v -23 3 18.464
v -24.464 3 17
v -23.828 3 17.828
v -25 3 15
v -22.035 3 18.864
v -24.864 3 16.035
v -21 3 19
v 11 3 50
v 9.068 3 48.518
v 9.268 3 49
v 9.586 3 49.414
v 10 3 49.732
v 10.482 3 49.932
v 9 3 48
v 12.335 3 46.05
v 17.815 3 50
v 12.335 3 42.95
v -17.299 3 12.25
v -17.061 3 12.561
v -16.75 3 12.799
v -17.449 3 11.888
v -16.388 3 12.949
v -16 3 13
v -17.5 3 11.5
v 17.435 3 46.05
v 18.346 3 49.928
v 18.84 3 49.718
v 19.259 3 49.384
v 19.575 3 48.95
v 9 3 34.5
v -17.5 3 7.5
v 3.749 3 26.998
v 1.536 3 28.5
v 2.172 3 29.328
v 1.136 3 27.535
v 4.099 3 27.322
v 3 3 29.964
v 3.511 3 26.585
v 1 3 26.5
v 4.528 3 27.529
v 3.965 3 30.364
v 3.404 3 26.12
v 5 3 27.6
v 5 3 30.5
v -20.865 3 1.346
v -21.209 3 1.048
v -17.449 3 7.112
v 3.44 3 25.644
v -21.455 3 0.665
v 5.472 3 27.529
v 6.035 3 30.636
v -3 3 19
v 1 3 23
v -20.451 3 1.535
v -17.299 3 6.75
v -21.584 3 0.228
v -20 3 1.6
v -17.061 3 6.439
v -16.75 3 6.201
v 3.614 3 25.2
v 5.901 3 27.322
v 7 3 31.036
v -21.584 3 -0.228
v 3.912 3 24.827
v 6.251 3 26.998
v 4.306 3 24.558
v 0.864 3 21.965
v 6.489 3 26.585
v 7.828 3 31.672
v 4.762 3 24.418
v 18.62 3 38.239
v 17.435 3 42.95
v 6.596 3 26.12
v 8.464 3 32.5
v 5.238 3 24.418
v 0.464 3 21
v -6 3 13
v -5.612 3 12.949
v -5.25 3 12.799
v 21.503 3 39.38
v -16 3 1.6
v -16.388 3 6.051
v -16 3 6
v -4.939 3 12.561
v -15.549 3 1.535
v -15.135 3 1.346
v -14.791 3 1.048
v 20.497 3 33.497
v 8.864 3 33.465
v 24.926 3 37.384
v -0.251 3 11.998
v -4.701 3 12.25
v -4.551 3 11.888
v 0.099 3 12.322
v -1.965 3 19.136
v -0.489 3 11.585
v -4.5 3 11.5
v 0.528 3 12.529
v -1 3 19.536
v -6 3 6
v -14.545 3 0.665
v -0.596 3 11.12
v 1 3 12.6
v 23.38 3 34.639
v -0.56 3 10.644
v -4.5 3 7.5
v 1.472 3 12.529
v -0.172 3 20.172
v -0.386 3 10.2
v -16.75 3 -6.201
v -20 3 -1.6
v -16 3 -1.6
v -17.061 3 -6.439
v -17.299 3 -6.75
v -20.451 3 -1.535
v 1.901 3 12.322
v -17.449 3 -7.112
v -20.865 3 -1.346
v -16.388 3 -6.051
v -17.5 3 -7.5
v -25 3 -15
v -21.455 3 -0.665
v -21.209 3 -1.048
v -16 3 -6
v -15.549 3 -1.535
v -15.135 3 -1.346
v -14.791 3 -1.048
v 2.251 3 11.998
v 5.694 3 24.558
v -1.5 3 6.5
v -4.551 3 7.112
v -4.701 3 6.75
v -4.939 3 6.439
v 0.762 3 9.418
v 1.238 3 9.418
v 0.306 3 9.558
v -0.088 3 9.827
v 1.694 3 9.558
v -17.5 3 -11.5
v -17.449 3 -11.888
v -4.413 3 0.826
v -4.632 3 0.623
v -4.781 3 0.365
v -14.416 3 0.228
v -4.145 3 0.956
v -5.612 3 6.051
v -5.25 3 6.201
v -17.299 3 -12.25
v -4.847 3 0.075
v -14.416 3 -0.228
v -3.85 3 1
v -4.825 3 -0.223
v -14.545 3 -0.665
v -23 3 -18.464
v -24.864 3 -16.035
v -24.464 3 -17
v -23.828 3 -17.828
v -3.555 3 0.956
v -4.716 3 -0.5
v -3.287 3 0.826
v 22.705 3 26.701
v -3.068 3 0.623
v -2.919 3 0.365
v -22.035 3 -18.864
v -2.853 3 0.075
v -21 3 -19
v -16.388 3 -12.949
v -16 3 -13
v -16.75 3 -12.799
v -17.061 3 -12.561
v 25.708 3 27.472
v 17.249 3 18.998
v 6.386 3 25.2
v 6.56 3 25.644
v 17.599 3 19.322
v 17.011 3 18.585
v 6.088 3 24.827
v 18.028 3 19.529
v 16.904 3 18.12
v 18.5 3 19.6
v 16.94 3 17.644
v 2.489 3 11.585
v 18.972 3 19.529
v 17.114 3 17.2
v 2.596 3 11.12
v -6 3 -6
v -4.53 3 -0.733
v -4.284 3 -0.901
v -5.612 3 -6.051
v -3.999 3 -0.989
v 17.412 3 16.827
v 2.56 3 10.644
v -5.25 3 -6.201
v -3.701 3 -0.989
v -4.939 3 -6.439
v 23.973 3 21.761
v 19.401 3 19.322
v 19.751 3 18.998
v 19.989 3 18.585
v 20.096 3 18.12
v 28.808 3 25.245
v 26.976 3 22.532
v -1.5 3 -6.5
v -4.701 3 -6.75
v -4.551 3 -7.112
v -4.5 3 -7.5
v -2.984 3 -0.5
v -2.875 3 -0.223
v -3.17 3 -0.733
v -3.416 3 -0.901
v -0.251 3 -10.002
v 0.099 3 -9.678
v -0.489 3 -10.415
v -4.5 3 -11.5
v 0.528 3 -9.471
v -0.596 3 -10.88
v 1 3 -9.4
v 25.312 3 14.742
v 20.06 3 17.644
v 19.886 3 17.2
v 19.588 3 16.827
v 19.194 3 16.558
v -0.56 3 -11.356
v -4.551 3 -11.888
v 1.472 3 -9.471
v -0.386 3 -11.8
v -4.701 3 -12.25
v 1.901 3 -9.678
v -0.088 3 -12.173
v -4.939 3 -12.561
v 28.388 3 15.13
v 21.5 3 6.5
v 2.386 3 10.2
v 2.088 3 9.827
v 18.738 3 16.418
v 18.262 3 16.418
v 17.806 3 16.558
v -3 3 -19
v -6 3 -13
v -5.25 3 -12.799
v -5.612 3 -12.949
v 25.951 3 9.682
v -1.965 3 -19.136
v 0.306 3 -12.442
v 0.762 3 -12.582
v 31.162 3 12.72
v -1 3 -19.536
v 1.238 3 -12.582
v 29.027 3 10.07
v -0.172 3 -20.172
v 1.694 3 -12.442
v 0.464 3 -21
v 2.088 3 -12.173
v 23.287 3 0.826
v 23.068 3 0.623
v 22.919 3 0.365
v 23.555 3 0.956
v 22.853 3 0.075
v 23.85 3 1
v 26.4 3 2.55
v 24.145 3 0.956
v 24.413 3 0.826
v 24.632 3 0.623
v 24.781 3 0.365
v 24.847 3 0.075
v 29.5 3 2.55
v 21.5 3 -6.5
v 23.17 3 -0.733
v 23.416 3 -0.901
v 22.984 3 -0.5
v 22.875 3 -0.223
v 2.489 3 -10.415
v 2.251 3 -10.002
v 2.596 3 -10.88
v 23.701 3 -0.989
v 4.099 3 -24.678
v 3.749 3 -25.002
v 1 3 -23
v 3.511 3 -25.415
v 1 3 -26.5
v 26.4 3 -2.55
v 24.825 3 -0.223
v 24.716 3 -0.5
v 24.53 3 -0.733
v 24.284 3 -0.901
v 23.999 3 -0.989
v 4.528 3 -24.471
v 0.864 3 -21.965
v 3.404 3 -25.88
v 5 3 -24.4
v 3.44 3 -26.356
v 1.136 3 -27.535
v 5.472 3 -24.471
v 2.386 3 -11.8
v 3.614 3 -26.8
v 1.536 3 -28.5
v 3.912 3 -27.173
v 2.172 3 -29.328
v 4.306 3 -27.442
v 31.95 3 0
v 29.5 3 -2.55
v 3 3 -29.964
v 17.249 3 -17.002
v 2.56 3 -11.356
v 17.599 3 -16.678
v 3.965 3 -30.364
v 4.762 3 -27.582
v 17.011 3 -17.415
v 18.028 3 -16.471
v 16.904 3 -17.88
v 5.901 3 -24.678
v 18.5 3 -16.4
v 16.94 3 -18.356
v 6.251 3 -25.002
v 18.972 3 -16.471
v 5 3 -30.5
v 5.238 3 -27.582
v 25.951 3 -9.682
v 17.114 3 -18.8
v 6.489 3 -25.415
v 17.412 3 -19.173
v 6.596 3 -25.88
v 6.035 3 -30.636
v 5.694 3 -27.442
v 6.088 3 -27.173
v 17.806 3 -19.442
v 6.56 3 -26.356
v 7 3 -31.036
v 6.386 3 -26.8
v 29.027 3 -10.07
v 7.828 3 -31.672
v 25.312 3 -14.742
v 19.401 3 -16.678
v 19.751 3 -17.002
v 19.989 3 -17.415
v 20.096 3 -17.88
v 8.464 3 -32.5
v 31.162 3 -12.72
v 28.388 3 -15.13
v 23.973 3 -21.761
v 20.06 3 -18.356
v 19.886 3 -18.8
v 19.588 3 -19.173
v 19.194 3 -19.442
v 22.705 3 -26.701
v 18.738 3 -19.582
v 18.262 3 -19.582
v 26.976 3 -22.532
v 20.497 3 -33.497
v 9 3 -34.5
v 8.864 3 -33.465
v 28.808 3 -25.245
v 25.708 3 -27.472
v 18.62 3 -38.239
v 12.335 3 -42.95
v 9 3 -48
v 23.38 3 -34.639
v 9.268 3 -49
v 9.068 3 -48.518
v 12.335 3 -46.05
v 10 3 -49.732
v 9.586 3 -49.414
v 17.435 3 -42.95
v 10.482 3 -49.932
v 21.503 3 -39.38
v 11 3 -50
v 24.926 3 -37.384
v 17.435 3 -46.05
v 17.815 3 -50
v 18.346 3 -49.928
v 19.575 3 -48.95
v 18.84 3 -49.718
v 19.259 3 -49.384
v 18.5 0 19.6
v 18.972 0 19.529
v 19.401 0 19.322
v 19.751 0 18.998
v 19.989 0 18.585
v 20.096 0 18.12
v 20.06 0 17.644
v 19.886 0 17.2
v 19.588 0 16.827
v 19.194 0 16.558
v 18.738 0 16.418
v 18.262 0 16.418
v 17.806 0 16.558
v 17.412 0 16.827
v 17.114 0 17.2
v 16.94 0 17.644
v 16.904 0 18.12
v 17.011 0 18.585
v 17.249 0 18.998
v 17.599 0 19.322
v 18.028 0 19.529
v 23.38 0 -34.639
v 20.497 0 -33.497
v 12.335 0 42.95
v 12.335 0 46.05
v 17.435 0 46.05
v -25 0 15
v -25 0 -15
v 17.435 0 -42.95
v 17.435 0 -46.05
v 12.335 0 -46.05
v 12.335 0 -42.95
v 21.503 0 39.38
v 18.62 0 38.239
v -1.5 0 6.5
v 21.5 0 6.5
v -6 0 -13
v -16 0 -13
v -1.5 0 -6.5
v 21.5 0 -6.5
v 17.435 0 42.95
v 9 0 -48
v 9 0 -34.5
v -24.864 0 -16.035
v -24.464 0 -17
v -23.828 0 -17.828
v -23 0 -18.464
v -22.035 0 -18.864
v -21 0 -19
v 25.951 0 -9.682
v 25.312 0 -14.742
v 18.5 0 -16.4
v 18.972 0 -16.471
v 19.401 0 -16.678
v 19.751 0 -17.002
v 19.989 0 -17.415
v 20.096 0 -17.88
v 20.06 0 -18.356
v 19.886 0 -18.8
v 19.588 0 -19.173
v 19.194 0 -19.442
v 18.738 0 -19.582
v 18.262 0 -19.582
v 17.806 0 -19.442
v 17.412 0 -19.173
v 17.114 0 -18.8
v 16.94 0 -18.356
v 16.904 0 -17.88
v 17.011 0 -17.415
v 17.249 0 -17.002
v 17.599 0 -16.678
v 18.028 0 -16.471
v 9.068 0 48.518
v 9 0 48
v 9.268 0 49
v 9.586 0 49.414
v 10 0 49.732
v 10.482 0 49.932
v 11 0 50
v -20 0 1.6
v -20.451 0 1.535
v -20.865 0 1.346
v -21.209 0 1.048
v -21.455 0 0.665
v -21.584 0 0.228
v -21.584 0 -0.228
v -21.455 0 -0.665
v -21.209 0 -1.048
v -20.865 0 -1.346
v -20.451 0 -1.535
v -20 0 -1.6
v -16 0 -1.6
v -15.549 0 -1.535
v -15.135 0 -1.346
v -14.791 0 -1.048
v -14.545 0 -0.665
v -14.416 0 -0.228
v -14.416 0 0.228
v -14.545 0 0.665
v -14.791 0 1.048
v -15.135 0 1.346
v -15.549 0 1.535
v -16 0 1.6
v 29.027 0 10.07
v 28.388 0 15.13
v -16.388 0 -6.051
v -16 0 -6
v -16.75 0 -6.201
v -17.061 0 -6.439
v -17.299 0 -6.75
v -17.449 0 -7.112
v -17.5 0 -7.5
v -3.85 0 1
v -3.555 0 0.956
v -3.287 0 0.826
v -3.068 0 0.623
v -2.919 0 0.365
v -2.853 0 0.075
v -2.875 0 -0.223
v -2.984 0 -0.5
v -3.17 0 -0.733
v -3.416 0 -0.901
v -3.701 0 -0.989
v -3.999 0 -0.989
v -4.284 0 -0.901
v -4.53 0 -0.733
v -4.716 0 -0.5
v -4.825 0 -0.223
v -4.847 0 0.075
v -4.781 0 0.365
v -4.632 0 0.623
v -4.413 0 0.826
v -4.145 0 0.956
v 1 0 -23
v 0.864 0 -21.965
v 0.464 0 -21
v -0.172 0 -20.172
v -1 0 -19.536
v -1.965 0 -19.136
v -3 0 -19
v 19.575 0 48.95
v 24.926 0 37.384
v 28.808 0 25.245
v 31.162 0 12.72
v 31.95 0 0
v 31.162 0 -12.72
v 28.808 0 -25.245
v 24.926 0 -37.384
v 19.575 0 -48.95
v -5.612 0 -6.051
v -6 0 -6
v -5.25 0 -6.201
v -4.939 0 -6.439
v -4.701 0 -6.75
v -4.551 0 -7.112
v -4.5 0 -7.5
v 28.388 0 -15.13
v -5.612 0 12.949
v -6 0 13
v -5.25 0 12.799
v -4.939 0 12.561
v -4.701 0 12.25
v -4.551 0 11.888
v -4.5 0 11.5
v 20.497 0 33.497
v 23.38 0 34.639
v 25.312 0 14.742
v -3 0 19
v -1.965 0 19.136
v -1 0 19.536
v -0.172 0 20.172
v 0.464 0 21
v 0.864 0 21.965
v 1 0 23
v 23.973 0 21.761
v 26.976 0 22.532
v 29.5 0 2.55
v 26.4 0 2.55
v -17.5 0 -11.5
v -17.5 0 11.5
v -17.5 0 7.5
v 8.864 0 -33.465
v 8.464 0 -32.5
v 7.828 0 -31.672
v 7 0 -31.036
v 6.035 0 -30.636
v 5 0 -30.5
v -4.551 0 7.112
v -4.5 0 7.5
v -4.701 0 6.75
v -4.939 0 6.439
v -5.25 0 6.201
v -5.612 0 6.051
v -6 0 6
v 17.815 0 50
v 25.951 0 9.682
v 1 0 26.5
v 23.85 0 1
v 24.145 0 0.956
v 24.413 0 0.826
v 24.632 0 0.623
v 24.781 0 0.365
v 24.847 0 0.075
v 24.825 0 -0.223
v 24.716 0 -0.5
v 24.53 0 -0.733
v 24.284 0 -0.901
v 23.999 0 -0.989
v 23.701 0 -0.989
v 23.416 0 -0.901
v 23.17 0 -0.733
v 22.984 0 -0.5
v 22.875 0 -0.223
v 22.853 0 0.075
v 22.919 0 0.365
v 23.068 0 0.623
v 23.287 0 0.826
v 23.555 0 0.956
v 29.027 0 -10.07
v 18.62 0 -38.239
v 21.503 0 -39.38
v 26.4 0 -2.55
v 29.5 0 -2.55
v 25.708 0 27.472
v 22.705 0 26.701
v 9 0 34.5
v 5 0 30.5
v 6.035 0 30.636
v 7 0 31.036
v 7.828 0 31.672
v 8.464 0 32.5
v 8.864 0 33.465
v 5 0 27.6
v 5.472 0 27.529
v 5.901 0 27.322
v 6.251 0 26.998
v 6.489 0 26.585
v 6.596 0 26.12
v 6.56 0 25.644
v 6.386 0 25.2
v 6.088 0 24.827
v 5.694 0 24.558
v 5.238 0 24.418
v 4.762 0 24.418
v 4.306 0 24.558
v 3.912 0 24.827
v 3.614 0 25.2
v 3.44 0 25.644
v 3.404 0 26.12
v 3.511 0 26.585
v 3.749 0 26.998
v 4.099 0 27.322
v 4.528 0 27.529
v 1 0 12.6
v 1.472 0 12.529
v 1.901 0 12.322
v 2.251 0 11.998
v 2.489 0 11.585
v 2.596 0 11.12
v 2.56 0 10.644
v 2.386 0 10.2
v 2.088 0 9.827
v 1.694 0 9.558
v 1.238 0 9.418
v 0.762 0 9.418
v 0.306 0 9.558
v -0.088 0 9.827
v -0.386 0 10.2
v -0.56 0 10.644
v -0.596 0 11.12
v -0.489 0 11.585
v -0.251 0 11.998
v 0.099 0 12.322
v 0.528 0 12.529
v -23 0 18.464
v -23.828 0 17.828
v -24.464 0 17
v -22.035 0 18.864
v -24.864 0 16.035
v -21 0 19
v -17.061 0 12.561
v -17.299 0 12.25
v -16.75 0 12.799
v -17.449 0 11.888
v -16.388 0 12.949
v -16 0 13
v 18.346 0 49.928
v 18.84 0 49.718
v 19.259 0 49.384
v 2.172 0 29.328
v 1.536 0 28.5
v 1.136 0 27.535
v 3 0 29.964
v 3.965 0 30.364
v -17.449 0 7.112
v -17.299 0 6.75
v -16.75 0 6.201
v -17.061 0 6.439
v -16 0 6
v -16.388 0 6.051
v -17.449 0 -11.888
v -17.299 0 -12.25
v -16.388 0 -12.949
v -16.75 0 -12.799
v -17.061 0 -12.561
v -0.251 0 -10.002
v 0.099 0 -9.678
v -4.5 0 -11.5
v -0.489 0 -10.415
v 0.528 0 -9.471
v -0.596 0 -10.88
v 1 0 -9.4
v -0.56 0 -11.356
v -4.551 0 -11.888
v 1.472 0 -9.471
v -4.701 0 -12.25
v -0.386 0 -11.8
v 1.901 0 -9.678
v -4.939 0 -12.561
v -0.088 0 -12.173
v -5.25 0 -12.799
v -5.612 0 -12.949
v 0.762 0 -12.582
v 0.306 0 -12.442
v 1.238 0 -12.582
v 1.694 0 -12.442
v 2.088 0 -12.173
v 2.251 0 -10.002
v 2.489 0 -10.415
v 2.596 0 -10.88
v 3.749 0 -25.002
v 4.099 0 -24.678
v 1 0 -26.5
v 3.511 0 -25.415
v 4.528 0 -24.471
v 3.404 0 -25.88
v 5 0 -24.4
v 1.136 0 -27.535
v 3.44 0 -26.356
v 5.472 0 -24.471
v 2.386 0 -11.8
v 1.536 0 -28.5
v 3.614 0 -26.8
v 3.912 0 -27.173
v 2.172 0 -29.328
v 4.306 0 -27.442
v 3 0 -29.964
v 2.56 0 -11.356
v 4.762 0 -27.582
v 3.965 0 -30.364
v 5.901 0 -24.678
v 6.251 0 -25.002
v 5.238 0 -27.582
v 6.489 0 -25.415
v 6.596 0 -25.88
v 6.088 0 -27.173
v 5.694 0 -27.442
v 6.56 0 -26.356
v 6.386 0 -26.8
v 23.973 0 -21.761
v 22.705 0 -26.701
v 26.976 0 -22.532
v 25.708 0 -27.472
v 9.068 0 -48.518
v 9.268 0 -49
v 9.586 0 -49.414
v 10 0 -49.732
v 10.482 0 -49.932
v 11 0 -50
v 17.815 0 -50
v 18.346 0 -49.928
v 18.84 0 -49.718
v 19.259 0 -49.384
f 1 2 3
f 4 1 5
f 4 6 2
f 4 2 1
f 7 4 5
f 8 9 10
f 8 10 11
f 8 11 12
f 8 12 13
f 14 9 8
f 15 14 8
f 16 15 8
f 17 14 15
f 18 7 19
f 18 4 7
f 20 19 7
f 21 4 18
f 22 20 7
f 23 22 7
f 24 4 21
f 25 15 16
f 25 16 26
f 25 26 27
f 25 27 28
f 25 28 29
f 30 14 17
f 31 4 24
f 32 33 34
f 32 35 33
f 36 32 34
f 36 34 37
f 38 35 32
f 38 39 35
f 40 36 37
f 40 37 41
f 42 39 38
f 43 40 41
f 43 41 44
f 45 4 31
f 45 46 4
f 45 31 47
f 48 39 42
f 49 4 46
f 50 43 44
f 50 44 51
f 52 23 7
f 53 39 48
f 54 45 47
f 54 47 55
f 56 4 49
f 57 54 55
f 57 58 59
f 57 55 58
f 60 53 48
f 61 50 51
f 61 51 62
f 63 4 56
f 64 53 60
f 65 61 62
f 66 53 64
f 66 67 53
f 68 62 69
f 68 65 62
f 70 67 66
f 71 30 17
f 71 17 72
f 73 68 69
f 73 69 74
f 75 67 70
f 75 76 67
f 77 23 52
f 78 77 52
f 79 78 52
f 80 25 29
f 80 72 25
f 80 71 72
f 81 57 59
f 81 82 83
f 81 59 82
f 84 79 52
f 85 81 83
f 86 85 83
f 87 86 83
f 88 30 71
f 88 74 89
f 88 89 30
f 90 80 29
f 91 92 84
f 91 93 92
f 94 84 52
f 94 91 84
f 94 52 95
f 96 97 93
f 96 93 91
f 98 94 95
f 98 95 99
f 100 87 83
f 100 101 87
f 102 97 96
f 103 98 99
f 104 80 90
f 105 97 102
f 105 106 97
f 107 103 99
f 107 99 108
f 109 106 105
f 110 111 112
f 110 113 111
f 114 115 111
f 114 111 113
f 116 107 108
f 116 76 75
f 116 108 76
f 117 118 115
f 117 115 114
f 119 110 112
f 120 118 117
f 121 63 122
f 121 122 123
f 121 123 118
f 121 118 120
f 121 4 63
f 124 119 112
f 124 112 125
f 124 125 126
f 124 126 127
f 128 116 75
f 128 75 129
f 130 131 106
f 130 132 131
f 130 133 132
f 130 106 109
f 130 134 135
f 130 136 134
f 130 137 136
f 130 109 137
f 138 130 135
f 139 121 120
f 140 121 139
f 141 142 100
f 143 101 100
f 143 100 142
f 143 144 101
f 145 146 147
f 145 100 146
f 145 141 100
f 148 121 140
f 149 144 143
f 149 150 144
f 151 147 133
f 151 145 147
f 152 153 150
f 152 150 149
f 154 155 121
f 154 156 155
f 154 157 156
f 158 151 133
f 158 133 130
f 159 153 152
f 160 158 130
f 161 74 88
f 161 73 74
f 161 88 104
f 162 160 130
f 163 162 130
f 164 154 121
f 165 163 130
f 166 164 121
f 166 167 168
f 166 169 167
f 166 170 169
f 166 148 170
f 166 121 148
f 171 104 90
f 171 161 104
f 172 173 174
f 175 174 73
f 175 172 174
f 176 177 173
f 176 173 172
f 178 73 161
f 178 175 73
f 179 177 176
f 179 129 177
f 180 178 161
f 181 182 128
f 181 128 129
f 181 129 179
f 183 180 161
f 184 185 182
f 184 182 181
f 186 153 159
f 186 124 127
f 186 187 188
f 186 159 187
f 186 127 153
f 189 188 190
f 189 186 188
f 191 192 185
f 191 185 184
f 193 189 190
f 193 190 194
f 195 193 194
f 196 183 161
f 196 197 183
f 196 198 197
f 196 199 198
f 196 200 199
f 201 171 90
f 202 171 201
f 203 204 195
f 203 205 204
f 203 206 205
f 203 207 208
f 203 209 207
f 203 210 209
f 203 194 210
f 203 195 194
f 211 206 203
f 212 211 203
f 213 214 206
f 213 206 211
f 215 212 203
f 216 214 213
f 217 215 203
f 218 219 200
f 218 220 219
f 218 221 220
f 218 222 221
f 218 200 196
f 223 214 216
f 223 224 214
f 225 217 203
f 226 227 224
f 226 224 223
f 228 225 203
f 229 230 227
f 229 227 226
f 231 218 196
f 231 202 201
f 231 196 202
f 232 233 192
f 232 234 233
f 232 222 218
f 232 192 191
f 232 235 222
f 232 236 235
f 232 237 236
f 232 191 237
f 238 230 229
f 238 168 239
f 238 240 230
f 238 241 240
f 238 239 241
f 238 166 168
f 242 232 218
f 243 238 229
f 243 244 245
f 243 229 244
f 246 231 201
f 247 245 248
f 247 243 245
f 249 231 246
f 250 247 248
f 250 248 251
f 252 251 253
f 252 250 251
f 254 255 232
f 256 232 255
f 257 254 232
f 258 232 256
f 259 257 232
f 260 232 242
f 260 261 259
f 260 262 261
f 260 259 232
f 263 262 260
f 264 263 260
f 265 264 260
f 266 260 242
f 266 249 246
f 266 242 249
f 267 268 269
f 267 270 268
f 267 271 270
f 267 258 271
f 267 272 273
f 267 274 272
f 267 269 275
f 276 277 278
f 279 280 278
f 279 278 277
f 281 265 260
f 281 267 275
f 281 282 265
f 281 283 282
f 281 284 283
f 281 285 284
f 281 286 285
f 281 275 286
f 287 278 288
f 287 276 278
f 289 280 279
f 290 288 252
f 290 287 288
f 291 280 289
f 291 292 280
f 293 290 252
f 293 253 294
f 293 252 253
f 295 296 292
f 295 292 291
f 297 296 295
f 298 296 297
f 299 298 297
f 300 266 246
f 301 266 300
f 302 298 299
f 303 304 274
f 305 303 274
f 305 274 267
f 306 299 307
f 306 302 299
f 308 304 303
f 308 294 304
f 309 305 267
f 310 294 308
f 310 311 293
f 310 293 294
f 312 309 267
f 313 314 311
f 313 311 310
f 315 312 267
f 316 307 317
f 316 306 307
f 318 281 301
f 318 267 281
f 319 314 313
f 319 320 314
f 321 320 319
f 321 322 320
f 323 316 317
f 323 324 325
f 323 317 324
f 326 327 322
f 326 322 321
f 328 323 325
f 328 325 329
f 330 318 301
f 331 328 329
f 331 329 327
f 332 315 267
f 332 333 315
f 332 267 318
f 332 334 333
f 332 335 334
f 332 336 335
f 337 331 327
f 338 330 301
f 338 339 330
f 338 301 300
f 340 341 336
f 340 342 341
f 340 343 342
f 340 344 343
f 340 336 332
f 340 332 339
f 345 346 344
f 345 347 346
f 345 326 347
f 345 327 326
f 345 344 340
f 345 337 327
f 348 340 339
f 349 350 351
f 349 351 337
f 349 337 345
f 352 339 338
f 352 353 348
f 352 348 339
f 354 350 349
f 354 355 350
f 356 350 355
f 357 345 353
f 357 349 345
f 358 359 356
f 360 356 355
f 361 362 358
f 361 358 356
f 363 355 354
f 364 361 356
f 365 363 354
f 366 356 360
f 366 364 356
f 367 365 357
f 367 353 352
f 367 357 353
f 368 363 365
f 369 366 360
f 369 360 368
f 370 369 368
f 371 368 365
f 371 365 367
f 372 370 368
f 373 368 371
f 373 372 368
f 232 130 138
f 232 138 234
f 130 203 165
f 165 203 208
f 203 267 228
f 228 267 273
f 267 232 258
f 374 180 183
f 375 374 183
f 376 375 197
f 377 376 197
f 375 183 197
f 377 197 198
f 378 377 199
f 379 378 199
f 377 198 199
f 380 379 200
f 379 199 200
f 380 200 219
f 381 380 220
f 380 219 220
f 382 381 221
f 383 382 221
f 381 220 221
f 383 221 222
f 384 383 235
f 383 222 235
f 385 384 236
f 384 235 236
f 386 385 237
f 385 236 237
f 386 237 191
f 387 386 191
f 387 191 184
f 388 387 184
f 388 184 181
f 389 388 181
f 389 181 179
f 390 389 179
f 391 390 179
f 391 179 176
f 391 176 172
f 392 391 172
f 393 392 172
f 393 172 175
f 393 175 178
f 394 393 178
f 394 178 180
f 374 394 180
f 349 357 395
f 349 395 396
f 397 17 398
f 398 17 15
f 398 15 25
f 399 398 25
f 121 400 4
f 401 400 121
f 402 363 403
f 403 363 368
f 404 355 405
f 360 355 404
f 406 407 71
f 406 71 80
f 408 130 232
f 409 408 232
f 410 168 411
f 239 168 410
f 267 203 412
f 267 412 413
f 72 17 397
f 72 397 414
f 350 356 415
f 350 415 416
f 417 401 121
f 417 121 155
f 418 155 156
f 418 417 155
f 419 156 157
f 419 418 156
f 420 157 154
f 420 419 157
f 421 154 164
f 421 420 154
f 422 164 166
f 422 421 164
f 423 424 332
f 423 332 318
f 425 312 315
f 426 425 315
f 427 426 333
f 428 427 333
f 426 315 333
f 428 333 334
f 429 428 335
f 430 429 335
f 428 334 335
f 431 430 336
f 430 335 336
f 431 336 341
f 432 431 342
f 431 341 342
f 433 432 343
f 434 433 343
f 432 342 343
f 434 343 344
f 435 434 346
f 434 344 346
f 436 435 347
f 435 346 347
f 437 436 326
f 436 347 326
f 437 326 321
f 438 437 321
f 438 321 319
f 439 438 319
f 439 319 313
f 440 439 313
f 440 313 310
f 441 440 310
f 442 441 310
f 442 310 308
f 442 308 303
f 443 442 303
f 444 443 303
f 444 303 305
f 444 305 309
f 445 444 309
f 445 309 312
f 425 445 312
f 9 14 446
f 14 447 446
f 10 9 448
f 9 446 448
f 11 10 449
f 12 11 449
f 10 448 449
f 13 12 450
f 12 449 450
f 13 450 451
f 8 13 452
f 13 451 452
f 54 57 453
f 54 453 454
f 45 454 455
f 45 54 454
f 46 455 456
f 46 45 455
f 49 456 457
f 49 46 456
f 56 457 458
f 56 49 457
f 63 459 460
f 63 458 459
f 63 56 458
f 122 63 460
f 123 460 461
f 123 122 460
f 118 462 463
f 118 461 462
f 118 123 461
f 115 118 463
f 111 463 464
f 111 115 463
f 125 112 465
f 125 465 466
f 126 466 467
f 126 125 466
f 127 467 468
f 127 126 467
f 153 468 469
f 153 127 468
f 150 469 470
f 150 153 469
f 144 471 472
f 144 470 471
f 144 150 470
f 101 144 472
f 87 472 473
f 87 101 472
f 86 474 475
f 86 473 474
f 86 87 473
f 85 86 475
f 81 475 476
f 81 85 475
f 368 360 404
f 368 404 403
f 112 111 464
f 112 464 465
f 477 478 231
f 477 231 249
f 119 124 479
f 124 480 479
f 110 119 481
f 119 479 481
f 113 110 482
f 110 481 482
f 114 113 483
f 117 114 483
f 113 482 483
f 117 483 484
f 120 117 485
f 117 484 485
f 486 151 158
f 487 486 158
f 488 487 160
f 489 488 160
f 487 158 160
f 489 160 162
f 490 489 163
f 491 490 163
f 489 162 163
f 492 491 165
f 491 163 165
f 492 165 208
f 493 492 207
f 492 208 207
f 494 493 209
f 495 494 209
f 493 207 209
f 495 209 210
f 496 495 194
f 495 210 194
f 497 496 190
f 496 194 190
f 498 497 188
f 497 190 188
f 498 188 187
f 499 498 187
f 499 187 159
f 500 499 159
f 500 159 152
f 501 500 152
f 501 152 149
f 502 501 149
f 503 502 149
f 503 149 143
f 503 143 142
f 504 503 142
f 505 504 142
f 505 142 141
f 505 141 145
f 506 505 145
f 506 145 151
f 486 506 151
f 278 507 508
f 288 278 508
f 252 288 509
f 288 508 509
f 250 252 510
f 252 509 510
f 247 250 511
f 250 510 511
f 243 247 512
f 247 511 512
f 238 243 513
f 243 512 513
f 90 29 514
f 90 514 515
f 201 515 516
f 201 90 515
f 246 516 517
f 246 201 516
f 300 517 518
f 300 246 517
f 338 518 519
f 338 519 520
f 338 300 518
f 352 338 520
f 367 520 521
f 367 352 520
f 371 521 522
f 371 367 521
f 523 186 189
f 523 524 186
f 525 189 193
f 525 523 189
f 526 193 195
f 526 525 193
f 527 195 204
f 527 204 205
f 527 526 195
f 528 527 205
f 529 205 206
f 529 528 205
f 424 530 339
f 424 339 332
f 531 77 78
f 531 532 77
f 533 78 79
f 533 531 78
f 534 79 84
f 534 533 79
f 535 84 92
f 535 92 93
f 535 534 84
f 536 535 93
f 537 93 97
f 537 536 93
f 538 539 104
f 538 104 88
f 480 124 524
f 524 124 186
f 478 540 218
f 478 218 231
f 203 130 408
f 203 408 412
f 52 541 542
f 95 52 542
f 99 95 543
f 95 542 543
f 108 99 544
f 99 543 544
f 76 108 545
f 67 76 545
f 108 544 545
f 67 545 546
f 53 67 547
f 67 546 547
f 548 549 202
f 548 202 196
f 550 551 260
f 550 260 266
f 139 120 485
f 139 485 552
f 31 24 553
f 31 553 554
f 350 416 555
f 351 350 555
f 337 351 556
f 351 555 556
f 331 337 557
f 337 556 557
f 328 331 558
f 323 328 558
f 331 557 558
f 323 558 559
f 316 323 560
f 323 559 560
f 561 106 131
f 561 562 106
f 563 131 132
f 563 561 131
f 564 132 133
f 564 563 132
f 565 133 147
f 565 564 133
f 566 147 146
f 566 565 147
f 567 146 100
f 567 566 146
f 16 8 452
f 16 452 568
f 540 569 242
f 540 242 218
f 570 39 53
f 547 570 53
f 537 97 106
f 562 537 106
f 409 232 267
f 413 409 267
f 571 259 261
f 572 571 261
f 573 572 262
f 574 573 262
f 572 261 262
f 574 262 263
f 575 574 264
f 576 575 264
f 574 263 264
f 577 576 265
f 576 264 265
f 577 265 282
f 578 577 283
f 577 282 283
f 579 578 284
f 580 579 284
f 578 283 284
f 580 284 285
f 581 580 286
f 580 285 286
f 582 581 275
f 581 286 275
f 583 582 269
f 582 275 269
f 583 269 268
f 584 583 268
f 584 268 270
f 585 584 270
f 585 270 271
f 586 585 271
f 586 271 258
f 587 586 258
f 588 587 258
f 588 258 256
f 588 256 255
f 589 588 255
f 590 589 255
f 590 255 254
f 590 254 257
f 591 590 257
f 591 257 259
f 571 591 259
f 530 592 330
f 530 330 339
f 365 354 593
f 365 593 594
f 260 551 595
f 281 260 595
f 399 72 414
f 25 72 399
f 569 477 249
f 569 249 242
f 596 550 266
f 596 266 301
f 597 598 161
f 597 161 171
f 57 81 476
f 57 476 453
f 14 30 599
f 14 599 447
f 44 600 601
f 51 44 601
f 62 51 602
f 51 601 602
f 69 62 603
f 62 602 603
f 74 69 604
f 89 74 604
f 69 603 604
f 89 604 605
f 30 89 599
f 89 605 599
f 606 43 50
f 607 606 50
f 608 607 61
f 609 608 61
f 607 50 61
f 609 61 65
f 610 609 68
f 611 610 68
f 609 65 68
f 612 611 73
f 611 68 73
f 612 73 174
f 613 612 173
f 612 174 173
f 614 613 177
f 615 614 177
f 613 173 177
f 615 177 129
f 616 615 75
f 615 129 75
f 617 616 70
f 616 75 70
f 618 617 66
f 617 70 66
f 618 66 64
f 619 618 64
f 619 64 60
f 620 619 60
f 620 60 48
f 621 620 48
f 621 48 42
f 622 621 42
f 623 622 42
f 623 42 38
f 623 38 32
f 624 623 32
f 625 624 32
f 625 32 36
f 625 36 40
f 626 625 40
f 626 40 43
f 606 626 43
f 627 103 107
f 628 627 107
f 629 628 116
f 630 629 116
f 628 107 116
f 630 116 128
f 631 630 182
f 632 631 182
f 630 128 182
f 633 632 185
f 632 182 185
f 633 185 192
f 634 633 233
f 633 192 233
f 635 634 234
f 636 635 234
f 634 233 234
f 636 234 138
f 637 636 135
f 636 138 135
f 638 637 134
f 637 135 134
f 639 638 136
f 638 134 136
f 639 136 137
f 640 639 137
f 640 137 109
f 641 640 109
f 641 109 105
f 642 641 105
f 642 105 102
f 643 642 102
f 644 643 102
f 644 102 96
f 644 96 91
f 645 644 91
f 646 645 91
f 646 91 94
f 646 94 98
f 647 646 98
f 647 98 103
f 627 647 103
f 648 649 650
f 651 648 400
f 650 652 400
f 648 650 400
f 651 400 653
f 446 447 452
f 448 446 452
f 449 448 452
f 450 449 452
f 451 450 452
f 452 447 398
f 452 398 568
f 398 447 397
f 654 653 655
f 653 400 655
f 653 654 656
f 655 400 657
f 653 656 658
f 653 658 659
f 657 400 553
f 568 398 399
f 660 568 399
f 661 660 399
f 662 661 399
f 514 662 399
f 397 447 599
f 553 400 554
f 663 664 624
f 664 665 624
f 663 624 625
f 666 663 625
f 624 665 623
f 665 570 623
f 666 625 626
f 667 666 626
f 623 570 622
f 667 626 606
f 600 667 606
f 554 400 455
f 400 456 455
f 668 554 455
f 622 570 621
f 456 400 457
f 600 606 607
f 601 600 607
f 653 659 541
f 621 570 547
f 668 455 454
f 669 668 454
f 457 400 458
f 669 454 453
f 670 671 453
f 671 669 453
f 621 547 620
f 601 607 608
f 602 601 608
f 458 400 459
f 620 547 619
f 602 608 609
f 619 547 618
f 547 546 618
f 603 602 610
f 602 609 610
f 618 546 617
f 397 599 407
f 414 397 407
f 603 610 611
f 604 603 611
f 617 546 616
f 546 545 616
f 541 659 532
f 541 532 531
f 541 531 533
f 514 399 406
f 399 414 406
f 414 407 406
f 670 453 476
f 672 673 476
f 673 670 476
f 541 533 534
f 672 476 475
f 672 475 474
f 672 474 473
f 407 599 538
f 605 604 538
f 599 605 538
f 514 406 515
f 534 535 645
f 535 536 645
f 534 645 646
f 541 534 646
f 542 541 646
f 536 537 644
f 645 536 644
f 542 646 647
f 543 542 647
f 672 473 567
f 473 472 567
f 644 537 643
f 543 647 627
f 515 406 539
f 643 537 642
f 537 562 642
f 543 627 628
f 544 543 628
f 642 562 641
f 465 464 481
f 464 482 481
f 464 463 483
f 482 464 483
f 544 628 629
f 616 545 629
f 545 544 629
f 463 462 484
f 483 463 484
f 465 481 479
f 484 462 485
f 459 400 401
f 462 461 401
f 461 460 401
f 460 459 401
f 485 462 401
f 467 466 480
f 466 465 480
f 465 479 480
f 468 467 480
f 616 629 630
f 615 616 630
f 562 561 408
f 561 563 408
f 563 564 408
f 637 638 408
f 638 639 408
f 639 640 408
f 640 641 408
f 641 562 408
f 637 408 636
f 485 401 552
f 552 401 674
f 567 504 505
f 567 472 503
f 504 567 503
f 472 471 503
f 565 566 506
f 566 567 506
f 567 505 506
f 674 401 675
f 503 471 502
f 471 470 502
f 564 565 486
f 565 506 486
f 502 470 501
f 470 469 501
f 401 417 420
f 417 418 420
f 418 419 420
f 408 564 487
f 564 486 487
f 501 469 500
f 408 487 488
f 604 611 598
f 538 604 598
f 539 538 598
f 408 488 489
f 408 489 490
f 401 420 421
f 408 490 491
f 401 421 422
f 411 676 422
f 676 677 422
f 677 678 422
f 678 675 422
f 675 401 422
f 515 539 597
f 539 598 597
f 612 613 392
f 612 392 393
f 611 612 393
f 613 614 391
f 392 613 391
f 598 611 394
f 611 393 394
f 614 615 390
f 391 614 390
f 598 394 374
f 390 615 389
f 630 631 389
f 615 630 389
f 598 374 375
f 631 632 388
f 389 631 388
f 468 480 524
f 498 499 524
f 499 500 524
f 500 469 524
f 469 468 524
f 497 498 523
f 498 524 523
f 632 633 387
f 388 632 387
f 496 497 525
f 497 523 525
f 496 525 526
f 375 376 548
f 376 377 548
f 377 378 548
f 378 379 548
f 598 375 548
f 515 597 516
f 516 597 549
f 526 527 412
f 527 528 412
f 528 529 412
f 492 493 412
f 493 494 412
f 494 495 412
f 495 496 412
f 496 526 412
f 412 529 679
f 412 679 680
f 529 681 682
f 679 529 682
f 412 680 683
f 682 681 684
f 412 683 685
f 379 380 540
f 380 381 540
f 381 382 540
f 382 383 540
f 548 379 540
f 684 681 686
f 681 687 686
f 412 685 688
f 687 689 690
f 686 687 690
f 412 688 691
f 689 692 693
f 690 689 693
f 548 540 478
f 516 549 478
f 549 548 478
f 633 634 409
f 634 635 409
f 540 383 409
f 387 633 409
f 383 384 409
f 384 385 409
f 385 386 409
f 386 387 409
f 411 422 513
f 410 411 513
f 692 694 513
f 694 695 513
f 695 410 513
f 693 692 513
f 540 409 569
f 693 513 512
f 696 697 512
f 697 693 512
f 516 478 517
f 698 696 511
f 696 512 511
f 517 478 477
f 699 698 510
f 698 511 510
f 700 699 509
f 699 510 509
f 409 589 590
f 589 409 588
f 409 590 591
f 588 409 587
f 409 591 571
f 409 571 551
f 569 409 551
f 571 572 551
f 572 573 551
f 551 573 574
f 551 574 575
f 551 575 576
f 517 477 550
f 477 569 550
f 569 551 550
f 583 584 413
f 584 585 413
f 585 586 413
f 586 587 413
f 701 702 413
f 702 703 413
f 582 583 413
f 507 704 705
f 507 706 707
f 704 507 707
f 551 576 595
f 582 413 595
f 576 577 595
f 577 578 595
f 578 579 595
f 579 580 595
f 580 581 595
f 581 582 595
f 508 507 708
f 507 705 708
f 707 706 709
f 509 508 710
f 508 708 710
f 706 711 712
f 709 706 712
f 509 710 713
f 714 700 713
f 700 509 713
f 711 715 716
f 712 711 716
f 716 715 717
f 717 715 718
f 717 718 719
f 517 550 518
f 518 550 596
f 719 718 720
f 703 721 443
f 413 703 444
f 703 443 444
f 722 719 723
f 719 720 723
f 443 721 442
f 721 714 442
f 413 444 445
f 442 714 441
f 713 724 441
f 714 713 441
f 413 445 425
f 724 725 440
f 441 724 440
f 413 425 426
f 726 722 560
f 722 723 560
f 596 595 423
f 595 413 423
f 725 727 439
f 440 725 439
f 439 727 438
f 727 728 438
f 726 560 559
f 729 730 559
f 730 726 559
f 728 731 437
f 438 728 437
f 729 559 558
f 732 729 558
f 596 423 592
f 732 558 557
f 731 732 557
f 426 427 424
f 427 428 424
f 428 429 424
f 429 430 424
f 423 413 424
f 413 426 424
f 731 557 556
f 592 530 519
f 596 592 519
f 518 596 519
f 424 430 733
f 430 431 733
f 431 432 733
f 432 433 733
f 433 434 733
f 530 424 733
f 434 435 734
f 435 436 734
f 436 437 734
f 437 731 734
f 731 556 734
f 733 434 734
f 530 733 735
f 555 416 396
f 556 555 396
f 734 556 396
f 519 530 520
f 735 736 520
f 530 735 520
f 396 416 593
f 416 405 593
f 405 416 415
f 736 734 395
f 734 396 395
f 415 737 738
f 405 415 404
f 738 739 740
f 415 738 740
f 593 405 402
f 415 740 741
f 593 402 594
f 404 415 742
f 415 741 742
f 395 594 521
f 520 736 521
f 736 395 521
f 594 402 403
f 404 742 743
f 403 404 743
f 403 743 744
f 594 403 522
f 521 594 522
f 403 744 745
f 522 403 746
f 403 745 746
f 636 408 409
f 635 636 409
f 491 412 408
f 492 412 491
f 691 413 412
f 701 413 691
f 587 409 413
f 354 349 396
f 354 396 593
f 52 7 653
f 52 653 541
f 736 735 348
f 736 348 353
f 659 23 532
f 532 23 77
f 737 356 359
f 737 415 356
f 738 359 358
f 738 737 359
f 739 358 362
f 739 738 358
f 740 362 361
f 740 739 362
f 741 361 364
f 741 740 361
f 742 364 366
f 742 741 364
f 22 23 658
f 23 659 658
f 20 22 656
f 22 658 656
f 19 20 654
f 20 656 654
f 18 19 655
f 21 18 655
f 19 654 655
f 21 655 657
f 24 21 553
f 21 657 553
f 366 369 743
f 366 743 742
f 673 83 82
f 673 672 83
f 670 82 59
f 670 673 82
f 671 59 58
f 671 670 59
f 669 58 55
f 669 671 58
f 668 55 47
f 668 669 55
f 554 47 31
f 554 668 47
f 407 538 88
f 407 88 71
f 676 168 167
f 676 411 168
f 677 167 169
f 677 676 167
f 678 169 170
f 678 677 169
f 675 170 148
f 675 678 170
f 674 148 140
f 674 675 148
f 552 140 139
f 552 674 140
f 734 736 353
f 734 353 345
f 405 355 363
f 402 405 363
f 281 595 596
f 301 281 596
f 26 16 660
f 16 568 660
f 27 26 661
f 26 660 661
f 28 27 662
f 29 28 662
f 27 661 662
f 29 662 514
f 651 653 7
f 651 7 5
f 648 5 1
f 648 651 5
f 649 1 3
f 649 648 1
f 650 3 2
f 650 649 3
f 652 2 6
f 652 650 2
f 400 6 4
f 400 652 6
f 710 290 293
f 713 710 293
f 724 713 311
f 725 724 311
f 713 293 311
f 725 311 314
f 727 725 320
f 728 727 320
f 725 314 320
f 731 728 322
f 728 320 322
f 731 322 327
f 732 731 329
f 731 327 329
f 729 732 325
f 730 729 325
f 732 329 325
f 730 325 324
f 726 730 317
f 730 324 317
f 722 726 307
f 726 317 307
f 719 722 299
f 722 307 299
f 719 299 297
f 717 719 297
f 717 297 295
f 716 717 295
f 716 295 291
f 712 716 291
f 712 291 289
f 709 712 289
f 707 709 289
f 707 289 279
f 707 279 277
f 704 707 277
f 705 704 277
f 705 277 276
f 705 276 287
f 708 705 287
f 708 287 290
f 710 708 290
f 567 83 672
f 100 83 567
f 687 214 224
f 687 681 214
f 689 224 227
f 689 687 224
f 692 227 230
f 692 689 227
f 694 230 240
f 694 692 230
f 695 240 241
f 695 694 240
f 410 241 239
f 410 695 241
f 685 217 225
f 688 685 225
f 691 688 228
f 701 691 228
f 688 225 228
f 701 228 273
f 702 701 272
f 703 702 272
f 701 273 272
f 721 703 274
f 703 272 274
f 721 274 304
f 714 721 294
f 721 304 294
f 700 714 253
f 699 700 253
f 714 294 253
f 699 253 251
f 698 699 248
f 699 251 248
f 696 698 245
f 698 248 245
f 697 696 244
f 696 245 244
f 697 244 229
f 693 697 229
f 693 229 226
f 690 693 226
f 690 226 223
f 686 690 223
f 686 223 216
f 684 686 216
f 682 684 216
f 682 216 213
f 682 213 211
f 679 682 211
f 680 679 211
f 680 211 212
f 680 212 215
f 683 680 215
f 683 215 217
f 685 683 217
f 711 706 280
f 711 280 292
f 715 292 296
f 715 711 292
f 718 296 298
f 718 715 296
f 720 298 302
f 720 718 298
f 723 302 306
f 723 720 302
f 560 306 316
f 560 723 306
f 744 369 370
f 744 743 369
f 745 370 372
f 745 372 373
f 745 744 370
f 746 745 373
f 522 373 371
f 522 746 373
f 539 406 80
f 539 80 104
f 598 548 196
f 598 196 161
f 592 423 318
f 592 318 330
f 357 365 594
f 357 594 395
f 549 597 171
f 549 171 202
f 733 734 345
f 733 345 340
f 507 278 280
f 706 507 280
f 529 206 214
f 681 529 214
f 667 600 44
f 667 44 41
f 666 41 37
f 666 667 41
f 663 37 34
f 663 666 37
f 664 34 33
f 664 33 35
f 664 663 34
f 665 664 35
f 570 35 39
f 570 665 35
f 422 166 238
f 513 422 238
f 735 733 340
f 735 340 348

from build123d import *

# Parameters (mm, degrees)
CROQUIS1_W              = 50
CROQUIS1_H              = 61
SALIENTE_EXTRUIR1_DEPTH = 3
CROQUIS2_R              = 1.6
CORTAR_EXTRUIR1_DEPTH   = 40.550600501
CROQUIS4_R              = 1
CROQUIS4_W              = 23
CROQUIS4_H              = 13
CORTAR_EXTRUIR3_DEPTH   = 10
CROQUIS7_R              = 1.6
CORTAR_EXTRUIR5_DEPTH   = 10
CROQUIS5_W              = 13
CROQUIS5_H              = 7
CROQUIS5_W_2            = 26
CROQUIS5_H_2            = 11.5
CORTAR_EXTRUIR4_DEPTH   = 10
REDONDEO4_R             = 1.5
SALIENTE_EXTRUIR2_DEPTH = 3
REDONDEO3_DEPTH         = 3
REDONDEO3_2_DEPTH       = 3
REDONDEO5_R             = 2
CROQUIS9_R              = 1.6
CORTAR_EXTRUIR6_DEPTH   = 60.41214848
CORTAR_EXTRUIR7_DEPTH   = 10
MATRIZ_CRV1_OUTLINE_W   = 3.1
MATRIZ_CRV1_OUTLINE_H   = 5.1
MATRIZ_CRV1_DEPTH       = 3
CROQUIS11_W             = 5.1
CROQUIS11_H             = 3.1
CORTAR_EXTRUIR8_DEPTH   = 3


with BuildPart() as part:
    # Croquis1 → Saliente-Extruir1 (new body)
    with BuildSketch(Plane(origin=(0, 0, 0), x_dir=(1, 0, 0), z_dir=(0, 1, 0))):
        Rectangle(CROQUIS1_W, CROQUIS1_H)
    extrude(amount=SALIENTE_EXTRUIR1_DEPTH)

    # Croquis2 → Cortar-Extruir1 (cut, through all)
    with BuildSketch(Plane(origin=(0, 3, 0), x_dir=(1, 0, 0), z_dir=(0, 1, 0))):
        with Locations(Location((1, 11, 0), (0, 0, 270))):
            Circle(CROQUIS2_R)
        with Locations(Location((1, -11, 0), (0, 0, 270))):
            Circle(CROQUIS2_R)
        with BuildLine():
            Line((-16, -1.6), (-20, -1.6))
            ThreePointArc((-20, -1.6), (-21.6, 0), (-20, 1.6))
            Line((-20, 1.6), (-16, 1.6))
            ThreePointArc((-16, 1.6), (-14.4, 0), (-16, -1.6))
        make_face()
    extrude(amount=-CORTAR_EXTRUIR1_DEPTH, mode=Mode.SUBTRACT)

    # Croquis4 → Cortar-Extruir3 (cut)
    with BuildSketch(Plane(origin=(0, 3, 0), x_dir=(1, 0, 0), z_dir=(0, 1, 0))):
        with Locations(Location((-3.85, 0, 0), (0, 0, 270))):
            Circle(CROQUIS4_R)
        with Locations(Location((23.85, 0, 0), (0, 0, 270))):
            Circle(CROQUIS4_R)
        with Locations((10, 0)):
            Rectangle(CROQUIS4_W, CROQUIS4_H)
    extrude(amount=-CORTAR_EXTRUIR3_DEPTH, mode=Mode.SUBTRACT)

    # Croquis7 → Cortar-Extruir5 (cut)
    with BuildSketch(Plane(origin=(0, 3, 0), x_dir=(1, 0, 0), z_dir=(0, 1, 0))):
        with Locations(Location((5, 26, 0), (0, 0, 270))):
            Circle(CROQUIS7_R)
        with Locations(Location((5, -26, 0), (0, 0, 270))):
            Circle(CROQUIS7_R)
    extrude(amount=-CORTAR_EXTRUIR5_DEPTH, mode=Mode.SUBTRACT)

    # Croquis5 → Cortar-Extruir4 (cut)
    with BuildSketch(Plane(origin=(0, 3, 0), x_dir=(1, 0, 0), z_dir=(0, 1, 0))):
        with Locations((-11, 9.5)):
            Rectangle(CROQUIS5_W, CROQUIS5_H)
        with Locations((-11, -9.5)):
            Rectangle(CROQUIS5_W, CROQUIS5_H)
        with Locations((-12, 24.75)):
            Rectangle(CROQUIS5_W_2, CROQUIS5_H_2)
        with Locations((-12, -24.75)):
            Rectangle(CROQUIS5_W_2, CROQUIS5_H_2)
    extrude(amount=-CORTAR_EXTRUIR4_DEPTH, mode=Mode.SUBTRACT)

    # Redondeo4
    redondeo4_edges = [part.edges().sort_by_distance(p)[0] for p in [
        (-4.5, 1.5, 6),
        (-4.5, 1.5, 13),
        (-17.5, 1.5, 13),
        (-17.5, 1.5, 6),
        (-4.5, 1.5, -13),
        (-4.5, 1.5, -6),
        (-17.5, 1.5, -6),
        (-17.5, 1.5, -13),
    ]]
    fillet(redondeo4_edges, radius=REDONDEO4_R)

    # Croquis8 → Saliente-Extruir2 (add, through all)
    with BuildSketch(Plane(origin=(0, 3, 0), x_dir=(1, 0, 0), z_dir=(0, 1, 0))):
        with BuildLine():
            Line((9, -50), (19, -50))
            ThreePointArc((19, -50), (31.950013881, 0), (19, 50))
            Line((19, 50), (9, 50))
            Line((9, 50), (9, 30.5))
            Line((9, 30.5), (25, 30.5))
            Line((25, 30.5), (25, -30.5))
            Line((25, -30.5), (9, -30.5))
            Line((9, -30.5), (9, -50))
        make_face()
    extrude(amount=-SALIENTE_EXTRUIR2_DEPTH)

    # Redondeo3: read off the stored shape, not the designer's step
    # Redondeo3 outline → Redondeo3 (cut)
    with BuildSketch(Plane(origin=(0, 0, 0), x_dir=(1, 0, 0), z_dir=(0, 1, 0))):
        with BuildLine():
            ThreePointArc((5, -30.5), (2.171572875, -29.328427125), (1, -26.5))
            Line((1, -26.5), (1, -30.5))
            Line((1, -30.5), (5, -30.5))
        make_face()
        with BuildLine():
            Line((1, 30.5), (1, 26.5))
            ThreePointArc((1, 26.5), (2.171572875, 29.328427125), (5, 30.5))
            Line((5, 30.5), (1, 30.5))
        make_face()
        with BuildLine():
            Line((-25, 19), (-25, 15))
            ThreePointArc((-25, 15), (-23.828427125, 17.828427125), (-21, 19))
            Line((-21, 19), (-25, 19))
        make_face()
        with BuildLine():
            Line((-25, -19), (-21, -19))
            ThreePointArc((-21, -19), (-23.828427125, -17.828427125), (-25, -15))
            Line((-25, -15), (-25, -19))
        make_face()
    extrude(amount=REDONDEO3_DEPTH, mode=Mode.SUBTRACT)

    # Redondeo3 2 outline → Redondeo3 2 (add)
    with BuildSketch(Plane(origin=(0, 0, 0), x_dir=(1, 0, 0), z_dir=(0, 1, 0))):
        with BuildLine():
            Line((9, -30.5), (5, -30.5))
            ThreePointArc((5, -30.5), (7.828427125, -31.671572875), (9, -34.5))
            Line((9, -34.5), (9, -30.5))
        make_face()
        with BuildLine():
            ThreePointArc((9, 34.5), (7.828427125, 31.671572875), (5, 30.5))
            Line((5, 30.5), (9, 30.5))
            Line((9, 30.5), (9, 34.5))
        make_face()
        with BuildLine():
            ThreePointArc((1, 23), (-0.171572875, 20.171572875), (-3, 19))
            Line((-3, 19), (1, 19))
            Line((1, 19), (1, 23))
        make_face()
        with BuildLine():
            ThreePointArc((-3, -19), (-0.171572875, -20.171572875), (1, -23))
            Line((1, -23), (1, -19))
            Line((1, -19), (-3, -19))
        make_face()
    extrude(amount=REDONDEO3_2_DEPTH)

    # Redondeo5
    redondeo5_edges = [part.edges().sort_by_distance(p)[0] for p in [
        (9, 1.5, 50),
        (9, 1.5, -50),
        (19, 1.5, -50),
        (19, 1.5, 50),
    ]]
    fillet(redondeo5_edges, radius=REDONDEO5_R)

    # Croquis9 → Cortar-Extruir6 (cut, through all)
    with BuildSketch(Plane(origin=(0, 3, 0), x_dir=(1, 0, 0), z_dir=(0, 1, 0))):
        with Locations(Location((18.5, 18, 0), (0, 0, 270))):
            Circle(CROQUIS9_R)
        with Locations(Location((18.5, -18, 0), (0, 0, 270))):
            Circle(CROQUIS9_R)
    extrude(amount=-CORTAR_EXTRUIR6_DEPTH, mode=Mode.SUBTRACT)

    # Croquis10 → Cortar-Extruir7 (cut)
    with BuildSketch(Plane(origin=(0, 3, 0), x_dir=(1, 0, 0), z_dir=(0, 1, 0))):
        Polygon((21.502606584, 39.380484813), (23.379766719, 34.638515831), (20.497393416, 33.497496925), (18.620233281, 38.239465907), align=None)
    extrude(amount=-CORTAR_EXTRUIR7_DEPTH, mode=Mode.SUBTRACT)

    # Matriz Crv1: read off the stored shape, not the designer's step
    # Matriz Crv1 outline → Matriz Crv1 (cut)
    with BuildSketch(Plane(origin=(0, 0, 0), x_dir=(1, 0, 0), z_dir=(0, 1, 0))):
        Polygon((21.502606584, -39.380484813), (23.379766719, -34.638515831), (20.497393416, -33.497496925), (18.620233281, -38.239465907), align=None)
        Polygon((25.707954041, -27.471913222), (26.976081424, -22.532090053), (23.973443811, -21.761267526), (22.705316428, -26.701090695), align=None)
        Polygon((28.387839944, -15.130226298), (29.026941594, -10.070428962), (25.951378508, -9.68195541), (25.312276858, -14.741752746), align=None)
        with Locations((27.950013881, 0)):
            Rectangle(MATRIZ_CRV1_OUTLINE_W, MATRIZ_CRV1_OUTLINE_H)
        Polygon((29.026941594, 10.070428962), (28.387839944, 15.130226298), (25.312276858, 14.741752746), (25.951378508, 9.68195541), align=None)
        Polygon((26.976081424, 22.532090053), (25.707954041, 27.471913222), (22.705316428, 26.701090695), (23.973443811, 21.761267526), align=None)
    extrude(amount=MATRIZ_CRV1_DEPTH, mode=Mode.SUBTRACT)

    # Croquis11 → Cortar-Extruir8 (cut)
    with BuildSketch(Plane(origin=(0, 3, 0), x_dir=(1, 0, 0), z_dir=(0, 1, 0))):
        with Locations((14.885018263, 44.5)):
            Rectangle(CROQUIS11_W, CROQUIS11_H)
    cortar_extruir8 = extrude(amount=-CORTAR_EXTRUIR8_DEPTH, mode=Mode.SUBTRACT)

    # Simetría1: Cortar-Extruir8 across plane
    add(cortar_extruir8.mirror(Plane.XY), mode=Mode.SUBTRACT)


solid = part.part
